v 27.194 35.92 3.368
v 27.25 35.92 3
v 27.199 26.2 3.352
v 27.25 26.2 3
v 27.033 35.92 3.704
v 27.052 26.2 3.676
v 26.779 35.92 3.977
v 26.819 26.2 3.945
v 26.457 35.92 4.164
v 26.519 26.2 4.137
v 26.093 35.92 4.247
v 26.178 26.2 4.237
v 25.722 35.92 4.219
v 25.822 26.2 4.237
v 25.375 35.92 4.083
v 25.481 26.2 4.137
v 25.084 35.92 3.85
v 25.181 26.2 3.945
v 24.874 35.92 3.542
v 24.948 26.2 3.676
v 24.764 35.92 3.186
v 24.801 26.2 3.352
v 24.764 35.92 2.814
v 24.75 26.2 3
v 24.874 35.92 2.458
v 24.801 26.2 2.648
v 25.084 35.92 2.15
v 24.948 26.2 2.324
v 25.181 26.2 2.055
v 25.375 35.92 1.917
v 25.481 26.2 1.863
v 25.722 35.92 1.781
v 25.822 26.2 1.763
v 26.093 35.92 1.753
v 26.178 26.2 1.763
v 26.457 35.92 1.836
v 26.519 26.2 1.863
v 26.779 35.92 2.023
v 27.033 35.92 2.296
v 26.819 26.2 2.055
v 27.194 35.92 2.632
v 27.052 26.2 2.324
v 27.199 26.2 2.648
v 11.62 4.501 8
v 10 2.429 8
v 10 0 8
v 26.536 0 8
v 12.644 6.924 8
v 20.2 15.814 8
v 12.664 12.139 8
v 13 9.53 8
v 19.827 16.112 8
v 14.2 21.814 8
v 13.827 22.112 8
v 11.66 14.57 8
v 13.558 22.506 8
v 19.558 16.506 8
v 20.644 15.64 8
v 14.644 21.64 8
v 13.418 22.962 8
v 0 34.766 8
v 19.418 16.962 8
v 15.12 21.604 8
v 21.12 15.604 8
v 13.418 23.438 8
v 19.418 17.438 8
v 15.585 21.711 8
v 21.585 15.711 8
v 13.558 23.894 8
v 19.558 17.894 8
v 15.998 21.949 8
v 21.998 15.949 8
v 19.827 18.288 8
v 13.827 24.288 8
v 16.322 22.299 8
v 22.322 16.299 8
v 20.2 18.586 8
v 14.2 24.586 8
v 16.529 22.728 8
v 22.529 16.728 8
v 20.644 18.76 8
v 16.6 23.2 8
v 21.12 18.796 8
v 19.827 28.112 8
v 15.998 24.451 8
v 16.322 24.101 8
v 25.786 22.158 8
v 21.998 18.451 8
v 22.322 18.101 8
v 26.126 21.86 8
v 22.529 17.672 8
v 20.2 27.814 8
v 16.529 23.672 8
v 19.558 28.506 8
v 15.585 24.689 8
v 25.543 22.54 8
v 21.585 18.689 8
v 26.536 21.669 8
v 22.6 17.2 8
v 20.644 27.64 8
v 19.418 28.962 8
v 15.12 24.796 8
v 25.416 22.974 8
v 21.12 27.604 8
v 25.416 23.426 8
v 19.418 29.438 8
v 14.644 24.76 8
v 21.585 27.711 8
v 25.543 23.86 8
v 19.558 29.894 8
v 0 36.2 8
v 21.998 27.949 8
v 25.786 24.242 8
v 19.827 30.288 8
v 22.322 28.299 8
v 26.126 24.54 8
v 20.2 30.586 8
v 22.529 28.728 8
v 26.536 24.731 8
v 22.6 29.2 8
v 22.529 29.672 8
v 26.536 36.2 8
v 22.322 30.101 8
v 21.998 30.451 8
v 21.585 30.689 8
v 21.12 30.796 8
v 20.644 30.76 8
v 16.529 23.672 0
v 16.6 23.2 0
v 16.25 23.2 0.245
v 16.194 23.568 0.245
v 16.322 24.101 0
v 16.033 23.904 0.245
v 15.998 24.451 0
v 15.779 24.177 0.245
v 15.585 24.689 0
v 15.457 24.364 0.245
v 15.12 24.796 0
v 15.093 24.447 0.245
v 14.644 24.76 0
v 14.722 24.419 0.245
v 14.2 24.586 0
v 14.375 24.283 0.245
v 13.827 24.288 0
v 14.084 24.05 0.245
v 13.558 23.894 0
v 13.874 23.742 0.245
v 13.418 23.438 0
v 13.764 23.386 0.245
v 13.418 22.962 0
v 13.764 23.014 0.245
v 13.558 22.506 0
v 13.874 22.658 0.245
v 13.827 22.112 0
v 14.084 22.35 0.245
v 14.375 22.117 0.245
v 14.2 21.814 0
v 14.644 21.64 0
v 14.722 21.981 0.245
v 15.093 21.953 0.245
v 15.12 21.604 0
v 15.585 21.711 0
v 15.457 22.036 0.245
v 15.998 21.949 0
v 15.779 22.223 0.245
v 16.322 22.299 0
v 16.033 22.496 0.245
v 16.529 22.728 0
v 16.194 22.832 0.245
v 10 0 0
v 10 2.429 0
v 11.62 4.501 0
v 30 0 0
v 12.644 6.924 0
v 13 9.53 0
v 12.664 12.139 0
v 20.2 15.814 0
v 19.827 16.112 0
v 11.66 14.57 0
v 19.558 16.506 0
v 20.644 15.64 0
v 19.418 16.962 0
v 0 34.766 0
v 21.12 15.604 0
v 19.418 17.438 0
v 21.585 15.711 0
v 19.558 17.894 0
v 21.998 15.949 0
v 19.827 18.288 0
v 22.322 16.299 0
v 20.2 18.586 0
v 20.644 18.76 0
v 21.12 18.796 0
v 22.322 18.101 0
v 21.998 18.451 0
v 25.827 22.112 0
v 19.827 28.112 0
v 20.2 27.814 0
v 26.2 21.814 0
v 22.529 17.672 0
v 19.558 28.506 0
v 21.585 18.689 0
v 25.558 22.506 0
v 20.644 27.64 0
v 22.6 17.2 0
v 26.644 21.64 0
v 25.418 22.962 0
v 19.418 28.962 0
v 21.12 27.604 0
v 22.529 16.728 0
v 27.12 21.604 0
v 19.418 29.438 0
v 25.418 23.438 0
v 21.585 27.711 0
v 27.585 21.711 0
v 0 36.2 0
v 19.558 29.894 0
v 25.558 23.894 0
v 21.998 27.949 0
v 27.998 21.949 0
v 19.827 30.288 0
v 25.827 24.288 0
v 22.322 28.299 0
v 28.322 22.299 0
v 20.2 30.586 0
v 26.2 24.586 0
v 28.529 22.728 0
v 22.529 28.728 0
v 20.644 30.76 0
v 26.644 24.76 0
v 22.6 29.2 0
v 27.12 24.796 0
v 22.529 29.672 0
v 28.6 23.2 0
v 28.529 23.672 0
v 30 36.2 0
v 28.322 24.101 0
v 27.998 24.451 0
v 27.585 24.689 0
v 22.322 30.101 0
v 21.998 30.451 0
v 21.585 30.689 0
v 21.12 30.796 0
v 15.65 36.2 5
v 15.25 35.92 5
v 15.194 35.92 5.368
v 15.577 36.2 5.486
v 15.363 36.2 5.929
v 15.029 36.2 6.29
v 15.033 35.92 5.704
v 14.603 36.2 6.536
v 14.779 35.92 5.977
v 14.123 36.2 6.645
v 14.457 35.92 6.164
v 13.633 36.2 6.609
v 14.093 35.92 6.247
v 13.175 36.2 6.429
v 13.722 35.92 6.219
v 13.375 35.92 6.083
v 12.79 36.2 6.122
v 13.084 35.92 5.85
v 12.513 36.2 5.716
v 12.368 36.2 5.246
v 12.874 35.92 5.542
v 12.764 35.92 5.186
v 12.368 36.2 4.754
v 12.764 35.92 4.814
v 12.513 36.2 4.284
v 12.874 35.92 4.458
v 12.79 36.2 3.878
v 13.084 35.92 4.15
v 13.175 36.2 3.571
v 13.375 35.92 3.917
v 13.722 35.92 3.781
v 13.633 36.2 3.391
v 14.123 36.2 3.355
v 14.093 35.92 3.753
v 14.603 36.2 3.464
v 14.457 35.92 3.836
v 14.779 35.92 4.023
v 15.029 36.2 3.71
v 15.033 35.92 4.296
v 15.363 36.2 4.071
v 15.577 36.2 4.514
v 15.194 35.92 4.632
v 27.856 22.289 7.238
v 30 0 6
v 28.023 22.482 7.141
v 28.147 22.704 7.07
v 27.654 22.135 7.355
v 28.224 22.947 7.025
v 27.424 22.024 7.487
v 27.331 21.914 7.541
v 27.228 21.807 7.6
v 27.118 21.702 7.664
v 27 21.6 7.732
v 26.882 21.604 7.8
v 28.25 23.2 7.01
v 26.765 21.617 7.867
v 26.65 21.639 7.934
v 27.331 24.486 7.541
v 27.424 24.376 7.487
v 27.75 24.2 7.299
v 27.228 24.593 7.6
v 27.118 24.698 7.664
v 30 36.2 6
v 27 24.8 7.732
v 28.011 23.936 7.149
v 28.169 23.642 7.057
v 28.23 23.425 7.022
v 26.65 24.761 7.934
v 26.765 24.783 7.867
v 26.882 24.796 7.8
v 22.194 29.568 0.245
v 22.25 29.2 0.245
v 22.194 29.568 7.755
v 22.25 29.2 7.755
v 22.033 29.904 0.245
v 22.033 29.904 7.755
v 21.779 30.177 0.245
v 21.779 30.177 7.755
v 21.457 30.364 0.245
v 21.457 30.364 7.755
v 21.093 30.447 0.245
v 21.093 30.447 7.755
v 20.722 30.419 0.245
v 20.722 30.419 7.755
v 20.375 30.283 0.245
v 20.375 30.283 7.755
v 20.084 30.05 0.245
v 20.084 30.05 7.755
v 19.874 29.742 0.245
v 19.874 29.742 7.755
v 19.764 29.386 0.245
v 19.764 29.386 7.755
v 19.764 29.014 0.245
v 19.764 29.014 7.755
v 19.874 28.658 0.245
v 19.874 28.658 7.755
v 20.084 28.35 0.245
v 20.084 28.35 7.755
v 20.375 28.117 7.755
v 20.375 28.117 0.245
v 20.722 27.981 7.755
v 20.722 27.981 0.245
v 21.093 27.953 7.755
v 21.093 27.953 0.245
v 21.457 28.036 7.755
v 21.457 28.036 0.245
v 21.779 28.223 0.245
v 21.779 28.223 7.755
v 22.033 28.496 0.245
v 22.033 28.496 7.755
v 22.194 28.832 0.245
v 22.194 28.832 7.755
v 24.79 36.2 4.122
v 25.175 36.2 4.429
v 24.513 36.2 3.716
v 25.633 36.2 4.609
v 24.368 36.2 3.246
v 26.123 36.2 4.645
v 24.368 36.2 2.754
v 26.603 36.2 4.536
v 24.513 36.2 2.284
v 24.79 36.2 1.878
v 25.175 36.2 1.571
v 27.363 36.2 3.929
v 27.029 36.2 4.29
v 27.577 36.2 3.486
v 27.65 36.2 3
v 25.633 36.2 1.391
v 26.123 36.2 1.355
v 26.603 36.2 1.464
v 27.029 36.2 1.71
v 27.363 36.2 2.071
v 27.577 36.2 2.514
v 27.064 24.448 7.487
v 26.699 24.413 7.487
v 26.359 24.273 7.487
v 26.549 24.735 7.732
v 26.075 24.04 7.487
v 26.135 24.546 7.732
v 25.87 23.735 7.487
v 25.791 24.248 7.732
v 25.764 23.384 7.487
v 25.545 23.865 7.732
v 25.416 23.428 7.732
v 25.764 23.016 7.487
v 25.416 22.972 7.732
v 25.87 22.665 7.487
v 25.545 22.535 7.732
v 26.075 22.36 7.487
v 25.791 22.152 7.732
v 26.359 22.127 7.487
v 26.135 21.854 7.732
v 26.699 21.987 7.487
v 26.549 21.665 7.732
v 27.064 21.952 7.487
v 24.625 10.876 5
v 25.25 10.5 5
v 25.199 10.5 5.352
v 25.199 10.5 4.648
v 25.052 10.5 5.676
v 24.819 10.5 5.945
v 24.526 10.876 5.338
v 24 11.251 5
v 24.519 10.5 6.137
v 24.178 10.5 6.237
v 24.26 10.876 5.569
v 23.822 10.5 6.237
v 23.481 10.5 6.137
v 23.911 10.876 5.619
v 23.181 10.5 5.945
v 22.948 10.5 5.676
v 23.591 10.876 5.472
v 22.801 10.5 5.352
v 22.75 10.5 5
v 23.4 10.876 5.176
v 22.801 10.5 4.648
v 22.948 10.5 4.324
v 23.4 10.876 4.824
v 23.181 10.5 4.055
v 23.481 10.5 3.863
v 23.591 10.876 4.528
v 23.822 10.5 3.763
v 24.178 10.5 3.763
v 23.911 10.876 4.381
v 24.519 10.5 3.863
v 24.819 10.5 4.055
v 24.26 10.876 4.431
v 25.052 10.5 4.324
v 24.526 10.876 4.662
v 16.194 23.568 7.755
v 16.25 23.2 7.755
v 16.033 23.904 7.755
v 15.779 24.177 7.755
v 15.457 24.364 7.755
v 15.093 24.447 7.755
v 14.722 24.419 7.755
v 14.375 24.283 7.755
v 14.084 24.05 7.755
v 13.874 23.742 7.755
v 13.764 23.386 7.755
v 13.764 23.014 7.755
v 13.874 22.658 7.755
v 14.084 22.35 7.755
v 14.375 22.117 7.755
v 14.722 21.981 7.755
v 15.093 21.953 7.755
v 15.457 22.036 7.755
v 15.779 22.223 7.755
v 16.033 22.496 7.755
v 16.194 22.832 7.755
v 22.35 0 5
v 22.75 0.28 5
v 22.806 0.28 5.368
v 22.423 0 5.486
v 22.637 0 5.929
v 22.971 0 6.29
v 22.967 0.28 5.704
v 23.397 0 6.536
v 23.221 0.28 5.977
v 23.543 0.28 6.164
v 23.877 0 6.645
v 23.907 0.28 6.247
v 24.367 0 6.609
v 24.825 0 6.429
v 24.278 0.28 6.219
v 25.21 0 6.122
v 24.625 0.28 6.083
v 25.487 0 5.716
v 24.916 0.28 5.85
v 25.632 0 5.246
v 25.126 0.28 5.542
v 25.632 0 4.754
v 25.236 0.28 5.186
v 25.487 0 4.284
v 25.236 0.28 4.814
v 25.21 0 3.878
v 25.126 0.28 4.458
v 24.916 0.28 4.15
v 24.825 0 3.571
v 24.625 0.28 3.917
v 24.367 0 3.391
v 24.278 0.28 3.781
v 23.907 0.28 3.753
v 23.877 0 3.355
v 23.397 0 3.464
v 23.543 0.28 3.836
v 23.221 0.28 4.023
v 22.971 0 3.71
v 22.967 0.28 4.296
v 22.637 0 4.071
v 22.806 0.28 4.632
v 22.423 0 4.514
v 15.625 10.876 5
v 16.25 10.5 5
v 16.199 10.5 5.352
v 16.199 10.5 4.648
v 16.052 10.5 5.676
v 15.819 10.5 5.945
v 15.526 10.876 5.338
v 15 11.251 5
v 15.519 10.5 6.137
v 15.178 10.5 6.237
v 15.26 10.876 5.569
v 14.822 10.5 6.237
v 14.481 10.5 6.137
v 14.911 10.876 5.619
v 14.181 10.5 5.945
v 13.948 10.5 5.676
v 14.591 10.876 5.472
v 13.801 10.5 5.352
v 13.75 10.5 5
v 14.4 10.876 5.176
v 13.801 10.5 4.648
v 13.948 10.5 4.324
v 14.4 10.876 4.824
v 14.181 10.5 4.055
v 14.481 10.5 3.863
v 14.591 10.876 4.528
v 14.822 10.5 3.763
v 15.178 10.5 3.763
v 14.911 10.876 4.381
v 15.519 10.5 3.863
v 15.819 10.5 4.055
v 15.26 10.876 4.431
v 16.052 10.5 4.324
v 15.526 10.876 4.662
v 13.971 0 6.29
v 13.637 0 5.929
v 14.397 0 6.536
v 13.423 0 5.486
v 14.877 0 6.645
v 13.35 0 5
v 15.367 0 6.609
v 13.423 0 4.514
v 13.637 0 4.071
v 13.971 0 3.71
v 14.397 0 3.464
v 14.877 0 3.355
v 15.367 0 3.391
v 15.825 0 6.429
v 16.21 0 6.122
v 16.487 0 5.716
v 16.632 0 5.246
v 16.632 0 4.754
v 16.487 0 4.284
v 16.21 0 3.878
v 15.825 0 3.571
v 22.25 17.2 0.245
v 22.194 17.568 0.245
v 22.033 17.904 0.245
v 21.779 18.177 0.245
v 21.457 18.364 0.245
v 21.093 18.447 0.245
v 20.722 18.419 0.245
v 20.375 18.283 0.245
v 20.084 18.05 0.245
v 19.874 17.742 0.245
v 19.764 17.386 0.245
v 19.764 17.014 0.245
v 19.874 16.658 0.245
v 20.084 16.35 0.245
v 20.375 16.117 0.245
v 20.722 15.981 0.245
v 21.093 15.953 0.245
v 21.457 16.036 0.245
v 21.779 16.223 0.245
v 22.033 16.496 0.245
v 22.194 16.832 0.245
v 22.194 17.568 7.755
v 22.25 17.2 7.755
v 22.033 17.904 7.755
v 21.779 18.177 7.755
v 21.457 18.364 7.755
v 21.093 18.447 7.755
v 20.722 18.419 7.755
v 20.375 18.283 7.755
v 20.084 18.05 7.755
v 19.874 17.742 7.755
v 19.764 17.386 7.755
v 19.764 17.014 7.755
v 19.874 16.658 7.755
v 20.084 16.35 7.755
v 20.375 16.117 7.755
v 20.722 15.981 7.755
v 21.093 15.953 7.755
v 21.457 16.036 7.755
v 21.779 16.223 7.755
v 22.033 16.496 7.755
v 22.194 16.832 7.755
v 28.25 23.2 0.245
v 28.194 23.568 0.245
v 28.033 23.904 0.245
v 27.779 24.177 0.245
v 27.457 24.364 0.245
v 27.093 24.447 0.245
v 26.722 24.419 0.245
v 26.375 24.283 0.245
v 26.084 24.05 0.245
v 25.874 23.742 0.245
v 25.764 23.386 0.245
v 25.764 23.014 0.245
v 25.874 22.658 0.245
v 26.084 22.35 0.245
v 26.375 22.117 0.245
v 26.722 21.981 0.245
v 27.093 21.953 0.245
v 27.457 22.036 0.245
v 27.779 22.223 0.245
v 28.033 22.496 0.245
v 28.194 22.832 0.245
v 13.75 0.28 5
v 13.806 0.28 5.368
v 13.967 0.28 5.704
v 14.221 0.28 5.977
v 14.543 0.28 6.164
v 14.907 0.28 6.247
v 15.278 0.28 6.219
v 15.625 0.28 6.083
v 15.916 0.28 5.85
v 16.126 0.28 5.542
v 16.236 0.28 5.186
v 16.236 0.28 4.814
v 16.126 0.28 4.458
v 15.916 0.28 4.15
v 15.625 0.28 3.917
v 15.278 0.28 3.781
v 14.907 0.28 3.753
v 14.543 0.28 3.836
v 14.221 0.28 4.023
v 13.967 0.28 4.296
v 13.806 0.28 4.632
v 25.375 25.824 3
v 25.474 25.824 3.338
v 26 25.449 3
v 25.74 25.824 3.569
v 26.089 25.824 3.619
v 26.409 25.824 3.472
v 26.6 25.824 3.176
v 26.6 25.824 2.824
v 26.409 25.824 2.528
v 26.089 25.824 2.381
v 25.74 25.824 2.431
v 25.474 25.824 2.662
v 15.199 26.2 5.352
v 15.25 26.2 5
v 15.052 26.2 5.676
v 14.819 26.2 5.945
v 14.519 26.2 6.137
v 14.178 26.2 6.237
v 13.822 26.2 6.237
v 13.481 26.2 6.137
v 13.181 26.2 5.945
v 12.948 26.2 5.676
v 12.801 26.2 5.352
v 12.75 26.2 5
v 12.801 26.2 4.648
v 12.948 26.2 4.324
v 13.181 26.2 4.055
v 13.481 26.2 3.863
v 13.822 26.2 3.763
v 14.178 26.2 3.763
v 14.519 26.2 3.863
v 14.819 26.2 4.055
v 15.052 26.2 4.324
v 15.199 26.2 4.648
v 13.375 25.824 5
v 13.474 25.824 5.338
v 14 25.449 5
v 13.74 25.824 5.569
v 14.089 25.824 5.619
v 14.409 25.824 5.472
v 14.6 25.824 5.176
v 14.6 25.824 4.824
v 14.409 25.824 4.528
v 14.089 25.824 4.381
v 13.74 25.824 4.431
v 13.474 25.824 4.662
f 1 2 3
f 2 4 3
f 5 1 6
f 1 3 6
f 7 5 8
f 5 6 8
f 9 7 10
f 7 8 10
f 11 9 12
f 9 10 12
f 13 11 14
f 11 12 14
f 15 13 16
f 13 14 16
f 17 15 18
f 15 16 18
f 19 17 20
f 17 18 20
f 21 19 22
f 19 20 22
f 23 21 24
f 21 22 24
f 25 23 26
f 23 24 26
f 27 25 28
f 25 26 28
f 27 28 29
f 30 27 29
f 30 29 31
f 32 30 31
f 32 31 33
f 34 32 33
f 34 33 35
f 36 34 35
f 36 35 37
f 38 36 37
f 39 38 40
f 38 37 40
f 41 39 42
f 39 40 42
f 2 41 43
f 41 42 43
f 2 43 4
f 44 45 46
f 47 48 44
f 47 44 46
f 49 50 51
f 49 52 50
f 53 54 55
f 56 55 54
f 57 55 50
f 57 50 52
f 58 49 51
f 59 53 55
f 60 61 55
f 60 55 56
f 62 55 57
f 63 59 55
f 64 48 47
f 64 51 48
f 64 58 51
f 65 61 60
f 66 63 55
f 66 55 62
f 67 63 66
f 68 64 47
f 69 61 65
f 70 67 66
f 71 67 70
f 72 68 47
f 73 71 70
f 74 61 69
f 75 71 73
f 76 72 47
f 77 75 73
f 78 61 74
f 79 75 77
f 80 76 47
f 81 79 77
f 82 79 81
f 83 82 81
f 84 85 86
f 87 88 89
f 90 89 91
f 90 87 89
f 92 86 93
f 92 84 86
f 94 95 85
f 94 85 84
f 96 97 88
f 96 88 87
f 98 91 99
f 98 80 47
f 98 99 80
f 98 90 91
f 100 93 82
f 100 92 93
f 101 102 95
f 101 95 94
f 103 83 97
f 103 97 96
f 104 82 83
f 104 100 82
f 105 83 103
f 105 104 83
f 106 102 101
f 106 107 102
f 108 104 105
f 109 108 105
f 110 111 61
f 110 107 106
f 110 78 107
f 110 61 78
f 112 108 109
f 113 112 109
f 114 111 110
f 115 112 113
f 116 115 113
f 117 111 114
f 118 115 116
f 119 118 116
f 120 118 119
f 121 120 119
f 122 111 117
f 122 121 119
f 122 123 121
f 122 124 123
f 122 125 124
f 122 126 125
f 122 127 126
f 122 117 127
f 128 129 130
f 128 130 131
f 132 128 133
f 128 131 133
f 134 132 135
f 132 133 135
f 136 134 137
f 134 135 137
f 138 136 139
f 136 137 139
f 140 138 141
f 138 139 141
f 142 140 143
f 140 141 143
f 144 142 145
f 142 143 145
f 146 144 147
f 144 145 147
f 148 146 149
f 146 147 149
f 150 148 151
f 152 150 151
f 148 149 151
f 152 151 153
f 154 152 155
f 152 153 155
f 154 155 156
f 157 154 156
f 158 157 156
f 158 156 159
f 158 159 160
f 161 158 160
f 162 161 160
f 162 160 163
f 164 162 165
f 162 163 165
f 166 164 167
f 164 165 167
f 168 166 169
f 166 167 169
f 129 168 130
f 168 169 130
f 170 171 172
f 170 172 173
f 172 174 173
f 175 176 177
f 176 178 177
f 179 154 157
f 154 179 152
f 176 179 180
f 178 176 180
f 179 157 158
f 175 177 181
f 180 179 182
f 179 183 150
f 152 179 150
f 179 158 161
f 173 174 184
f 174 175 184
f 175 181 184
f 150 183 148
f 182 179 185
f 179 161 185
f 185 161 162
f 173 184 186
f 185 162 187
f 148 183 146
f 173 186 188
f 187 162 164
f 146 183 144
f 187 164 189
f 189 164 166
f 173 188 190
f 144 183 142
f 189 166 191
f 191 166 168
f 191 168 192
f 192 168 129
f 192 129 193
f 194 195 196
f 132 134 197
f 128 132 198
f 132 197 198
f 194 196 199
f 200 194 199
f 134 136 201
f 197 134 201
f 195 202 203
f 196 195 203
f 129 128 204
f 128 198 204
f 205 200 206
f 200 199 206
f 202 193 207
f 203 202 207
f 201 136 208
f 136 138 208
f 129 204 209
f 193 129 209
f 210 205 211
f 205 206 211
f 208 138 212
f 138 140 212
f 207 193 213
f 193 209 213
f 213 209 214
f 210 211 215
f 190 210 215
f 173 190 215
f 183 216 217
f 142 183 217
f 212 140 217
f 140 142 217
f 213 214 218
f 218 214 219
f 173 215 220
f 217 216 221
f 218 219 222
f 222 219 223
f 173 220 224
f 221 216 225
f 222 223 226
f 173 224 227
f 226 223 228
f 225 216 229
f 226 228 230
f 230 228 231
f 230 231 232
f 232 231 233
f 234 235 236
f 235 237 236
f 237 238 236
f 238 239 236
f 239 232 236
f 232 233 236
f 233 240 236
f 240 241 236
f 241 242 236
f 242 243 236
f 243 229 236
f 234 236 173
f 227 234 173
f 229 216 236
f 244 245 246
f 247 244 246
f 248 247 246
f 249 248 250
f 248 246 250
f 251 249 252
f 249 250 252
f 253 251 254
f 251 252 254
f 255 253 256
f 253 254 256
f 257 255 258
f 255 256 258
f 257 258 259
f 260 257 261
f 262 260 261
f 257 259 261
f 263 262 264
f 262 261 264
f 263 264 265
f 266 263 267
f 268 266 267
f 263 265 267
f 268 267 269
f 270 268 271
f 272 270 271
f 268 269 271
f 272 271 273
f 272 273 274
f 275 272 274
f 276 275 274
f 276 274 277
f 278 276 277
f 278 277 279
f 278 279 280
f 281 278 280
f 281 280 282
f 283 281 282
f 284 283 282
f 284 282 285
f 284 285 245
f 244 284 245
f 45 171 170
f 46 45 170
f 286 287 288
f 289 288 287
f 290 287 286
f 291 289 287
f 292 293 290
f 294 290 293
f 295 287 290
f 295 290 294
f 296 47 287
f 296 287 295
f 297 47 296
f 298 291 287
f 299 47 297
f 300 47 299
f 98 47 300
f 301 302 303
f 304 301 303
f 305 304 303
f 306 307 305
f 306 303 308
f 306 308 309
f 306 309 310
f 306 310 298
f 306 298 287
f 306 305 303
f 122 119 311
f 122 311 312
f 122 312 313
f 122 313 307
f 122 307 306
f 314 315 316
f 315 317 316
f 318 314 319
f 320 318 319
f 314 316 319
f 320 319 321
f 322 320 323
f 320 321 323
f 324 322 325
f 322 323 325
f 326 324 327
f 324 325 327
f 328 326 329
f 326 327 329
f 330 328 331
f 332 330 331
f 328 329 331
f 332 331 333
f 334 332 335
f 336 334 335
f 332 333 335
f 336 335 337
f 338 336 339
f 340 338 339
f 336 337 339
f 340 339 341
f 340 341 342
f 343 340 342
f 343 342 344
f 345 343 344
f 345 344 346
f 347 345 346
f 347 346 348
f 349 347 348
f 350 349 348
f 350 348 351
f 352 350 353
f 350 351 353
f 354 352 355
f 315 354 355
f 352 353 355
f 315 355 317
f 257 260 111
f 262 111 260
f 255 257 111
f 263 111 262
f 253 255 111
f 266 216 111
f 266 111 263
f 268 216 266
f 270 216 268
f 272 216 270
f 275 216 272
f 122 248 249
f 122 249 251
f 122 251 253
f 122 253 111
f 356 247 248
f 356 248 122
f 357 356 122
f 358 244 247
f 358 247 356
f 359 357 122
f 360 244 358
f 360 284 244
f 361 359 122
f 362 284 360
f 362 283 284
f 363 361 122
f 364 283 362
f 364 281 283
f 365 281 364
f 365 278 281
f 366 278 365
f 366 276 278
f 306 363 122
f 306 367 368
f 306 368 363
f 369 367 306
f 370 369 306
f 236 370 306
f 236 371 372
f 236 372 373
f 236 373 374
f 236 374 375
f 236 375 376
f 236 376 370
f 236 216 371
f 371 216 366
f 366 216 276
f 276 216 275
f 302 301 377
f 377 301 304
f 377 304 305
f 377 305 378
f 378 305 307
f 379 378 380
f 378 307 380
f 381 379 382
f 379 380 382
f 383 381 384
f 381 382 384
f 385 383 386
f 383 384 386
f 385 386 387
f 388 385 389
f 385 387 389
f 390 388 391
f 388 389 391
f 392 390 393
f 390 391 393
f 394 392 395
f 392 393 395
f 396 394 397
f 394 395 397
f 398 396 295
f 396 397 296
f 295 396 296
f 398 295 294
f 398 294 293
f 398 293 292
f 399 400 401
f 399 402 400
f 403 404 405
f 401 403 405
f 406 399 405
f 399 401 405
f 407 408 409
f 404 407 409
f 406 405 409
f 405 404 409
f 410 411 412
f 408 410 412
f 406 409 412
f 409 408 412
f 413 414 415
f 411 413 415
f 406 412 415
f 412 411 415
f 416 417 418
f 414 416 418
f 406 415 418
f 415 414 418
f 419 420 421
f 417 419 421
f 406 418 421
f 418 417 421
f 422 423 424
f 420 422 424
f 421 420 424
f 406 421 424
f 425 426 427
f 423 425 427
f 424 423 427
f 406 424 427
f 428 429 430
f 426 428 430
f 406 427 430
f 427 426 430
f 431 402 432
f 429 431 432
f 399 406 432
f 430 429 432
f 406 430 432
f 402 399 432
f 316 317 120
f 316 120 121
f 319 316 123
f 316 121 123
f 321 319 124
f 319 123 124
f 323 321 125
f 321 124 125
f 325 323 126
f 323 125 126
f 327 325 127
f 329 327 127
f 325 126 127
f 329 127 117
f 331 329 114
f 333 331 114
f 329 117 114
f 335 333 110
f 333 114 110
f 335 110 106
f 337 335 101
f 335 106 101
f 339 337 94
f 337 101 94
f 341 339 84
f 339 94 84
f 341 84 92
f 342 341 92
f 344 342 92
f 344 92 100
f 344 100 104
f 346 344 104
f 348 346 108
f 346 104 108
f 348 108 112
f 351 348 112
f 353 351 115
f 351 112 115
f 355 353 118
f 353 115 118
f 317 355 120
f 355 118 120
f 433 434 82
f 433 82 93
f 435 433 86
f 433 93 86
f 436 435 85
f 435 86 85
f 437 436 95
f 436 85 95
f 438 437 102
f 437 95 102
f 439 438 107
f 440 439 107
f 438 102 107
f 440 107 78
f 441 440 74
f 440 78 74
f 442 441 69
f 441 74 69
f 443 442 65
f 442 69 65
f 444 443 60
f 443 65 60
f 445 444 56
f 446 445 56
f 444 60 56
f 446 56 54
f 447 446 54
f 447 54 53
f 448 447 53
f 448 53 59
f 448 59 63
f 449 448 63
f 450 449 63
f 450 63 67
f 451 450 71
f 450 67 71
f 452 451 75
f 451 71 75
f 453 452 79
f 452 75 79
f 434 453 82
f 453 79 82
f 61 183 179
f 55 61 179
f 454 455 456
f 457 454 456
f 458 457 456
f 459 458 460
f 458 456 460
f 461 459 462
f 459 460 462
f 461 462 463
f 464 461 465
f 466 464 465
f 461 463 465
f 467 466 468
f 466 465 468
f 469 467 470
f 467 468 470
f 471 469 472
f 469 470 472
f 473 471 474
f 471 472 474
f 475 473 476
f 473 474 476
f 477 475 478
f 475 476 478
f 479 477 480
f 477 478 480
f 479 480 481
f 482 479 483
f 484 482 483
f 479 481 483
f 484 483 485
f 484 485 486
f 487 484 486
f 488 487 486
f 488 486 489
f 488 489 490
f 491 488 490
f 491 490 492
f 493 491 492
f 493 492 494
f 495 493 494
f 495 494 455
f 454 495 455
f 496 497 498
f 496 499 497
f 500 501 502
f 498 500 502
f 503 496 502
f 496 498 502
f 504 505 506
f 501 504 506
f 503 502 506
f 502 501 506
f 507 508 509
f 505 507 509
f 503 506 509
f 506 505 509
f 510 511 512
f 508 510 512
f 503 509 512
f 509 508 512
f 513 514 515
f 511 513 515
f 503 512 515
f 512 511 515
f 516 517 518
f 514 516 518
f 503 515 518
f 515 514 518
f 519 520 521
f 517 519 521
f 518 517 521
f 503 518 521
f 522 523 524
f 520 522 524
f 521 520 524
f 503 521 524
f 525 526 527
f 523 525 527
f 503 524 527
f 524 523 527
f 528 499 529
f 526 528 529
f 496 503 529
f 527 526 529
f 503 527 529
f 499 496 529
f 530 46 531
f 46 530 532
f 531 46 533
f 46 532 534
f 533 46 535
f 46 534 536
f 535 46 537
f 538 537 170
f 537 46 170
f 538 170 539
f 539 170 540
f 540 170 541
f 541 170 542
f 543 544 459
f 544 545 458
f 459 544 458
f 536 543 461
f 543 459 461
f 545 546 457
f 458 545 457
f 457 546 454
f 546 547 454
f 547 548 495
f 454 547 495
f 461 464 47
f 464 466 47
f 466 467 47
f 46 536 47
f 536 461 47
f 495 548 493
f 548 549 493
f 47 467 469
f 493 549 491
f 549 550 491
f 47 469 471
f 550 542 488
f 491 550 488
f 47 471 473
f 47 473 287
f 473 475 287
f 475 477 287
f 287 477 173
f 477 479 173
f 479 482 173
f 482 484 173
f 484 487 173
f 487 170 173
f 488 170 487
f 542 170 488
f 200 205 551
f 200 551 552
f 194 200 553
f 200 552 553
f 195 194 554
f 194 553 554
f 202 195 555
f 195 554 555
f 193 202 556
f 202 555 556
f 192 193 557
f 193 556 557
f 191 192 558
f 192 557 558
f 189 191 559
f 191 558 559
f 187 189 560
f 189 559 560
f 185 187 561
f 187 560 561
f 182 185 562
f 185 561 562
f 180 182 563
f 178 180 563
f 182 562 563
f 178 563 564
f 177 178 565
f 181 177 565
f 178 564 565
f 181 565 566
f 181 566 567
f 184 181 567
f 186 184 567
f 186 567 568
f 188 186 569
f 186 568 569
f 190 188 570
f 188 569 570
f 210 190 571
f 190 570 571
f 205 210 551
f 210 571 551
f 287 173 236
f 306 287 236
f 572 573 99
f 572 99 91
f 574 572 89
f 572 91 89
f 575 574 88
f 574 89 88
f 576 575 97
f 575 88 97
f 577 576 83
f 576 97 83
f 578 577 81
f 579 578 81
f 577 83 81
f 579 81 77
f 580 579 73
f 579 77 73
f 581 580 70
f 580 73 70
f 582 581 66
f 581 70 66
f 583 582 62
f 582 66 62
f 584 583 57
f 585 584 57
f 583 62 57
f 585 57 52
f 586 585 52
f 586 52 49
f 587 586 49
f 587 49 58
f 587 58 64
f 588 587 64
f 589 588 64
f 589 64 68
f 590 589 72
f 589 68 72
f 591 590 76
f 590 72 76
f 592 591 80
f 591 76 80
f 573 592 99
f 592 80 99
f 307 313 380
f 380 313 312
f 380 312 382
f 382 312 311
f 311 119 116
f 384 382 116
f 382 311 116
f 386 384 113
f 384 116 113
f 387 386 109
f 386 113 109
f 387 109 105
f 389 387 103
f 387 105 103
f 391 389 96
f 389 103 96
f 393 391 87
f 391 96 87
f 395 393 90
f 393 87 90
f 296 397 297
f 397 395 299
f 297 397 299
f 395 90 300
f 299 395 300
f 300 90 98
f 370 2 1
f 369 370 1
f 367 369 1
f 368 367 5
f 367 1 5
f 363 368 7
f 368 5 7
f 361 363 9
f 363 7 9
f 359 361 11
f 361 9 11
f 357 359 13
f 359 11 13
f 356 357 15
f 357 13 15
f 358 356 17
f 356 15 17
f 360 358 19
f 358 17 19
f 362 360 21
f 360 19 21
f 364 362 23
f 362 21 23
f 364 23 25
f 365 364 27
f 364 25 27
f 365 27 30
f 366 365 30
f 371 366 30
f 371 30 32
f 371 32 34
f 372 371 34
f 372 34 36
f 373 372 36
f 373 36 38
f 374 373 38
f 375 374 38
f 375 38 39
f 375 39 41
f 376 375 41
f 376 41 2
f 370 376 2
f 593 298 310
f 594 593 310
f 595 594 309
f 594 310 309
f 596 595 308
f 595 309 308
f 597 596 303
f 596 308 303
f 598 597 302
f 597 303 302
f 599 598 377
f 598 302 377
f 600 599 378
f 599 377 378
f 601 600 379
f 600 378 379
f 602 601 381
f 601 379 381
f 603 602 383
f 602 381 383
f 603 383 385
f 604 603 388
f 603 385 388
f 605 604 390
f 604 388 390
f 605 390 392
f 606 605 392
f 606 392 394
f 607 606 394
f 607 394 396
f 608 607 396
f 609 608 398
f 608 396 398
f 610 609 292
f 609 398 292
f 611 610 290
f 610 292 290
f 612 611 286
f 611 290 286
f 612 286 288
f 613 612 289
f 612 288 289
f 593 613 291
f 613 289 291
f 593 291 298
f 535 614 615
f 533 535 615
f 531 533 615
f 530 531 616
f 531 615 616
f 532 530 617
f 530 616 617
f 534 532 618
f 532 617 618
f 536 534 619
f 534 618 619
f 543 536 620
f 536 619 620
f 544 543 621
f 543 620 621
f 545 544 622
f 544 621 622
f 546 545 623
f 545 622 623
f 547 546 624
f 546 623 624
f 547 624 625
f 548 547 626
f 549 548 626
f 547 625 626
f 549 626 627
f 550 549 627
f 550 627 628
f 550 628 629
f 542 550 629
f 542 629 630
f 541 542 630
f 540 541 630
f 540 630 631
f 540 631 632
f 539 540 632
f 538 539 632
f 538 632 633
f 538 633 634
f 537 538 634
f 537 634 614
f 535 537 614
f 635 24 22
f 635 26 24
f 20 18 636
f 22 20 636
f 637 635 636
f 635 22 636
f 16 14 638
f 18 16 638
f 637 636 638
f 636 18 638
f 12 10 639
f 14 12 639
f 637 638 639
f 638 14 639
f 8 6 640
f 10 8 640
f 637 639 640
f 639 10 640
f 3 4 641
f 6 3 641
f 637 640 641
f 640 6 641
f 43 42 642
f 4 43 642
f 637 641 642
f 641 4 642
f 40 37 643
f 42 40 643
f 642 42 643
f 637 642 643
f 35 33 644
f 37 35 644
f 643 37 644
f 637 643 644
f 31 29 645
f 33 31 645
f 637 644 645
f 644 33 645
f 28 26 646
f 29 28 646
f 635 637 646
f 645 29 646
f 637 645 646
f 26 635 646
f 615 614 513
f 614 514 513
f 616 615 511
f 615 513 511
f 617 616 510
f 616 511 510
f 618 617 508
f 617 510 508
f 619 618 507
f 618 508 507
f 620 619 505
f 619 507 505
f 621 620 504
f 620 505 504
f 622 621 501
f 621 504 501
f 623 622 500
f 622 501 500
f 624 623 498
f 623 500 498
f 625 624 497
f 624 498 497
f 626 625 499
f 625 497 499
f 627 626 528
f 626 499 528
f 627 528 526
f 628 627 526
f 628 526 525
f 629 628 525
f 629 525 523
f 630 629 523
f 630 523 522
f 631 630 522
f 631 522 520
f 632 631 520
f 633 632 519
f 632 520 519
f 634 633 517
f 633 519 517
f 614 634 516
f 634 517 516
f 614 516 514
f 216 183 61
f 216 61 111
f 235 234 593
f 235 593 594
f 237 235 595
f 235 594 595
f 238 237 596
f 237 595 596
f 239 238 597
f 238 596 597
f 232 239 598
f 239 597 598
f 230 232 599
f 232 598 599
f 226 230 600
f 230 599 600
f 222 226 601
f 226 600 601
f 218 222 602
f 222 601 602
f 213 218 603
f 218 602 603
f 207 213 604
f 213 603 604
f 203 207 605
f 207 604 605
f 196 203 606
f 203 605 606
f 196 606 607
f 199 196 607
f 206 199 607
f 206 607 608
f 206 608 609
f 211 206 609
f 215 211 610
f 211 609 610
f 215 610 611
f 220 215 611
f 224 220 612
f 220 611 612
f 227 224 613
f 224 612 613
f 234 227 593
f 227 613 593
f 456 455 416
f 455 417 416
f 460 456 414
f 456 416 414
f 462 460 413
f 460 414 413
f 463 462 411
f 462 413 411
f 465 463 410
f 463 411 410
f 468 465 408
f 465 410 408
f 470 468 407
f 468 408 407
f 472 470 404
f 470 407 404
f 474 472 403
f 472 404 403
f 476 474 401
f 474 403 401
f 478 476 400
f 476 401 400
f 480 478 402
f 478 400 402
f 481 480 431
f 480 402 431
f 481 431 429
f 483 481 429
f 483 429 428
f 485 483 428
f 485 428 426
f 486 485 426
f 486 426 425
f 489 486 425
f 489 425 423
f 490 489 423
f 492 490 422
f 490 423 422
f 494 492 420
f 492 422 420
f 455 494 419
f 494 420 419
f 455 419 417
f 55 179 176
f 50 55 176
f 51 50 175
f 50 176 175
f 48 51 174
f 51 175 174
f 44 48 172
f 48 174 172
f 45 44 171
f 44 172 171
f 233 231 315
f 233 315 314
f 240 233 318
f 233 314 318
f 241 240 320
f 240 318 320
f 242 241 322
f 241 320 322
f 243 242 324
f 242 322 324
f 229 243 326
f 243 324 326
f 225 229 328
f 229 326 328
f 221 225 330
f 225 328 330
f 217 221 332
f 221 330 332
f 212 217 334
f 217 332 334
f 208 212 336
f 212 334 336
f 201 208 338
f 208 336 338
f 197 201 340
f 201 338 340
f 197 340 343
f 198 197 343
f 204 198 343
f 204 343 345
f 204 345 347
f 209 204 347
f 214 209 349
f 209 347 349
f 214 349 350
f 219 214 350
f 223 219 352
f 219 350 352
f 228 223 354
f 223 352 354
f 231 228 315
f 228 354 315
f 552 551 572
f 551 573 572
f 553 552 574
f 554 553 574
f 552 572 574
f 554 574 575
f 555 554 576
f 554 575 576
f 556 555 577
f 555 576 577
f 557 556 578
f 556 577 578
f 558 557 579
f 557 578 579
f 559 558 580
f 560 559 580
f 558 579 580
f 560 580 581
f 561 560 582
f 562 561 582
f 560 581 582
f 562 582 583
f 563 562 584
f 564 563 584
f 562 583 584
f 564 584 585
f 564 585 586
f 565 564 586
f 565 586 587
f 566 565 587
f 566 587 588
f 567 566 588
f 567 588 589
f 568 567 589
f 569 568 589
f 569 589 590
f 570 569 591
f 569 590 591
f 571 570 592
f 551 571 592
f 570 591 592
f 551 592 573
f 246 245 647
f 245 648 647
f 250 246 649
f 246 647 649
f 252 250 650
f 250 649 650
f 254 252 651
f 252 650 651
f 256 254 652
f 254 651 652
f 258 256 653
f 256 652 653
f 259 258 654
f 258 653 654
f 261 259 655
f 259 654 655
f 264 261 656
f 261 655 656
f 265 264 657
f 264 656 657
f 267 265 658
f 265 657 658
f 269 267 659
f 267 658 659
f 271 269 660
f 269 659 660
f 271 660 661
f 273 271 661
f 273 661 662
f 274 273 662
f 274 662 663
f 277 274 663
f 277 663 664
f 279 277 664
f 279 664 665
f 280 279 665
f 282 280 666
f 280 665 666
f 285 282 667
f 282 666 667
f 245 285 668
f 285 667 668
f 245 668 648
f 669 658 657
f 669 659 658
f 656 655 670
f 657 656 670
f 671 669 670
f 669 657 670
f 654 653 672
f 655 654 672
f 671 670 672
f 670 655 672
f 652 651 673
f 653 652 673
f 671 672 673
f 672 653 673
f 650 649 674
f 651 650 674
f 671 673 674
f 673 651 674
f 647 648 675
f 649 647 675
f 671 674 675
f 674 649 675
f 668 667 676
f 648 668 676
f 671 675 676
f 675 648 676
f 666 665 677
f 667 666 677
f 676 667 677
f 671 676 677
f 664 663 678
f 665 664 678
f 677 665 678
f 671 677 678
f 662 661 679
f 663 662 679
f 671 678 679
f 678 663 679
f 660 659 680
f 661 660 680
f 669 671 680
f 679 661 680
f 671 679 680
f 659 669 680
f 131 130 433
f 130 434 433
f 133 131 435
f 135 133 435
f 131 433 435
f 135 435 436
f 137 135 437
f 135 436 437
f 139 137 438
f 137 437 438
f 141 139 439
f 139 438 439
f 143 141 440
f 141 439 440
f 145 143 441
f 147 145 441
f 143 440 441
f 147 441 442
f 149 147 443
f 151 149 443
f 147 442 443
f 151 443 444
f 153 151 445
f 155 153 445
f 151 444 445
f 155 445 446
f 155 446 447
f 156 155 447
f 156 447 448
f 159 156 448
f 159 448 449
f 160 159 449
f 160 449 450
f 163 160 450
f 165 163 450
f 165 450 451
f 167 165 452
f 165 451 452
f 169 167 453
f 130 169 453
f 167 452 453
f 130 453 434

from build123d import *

# Parameters (mm, degrees)
SKETCH_1_W                  = 30
SKETCH_1_H                  = 36.2
EXTRUDE_1_DEPTH             = 8
CUT_EXTRUDE_1_DEPTH         = 48.691089314
CHAMFER_1_SIZE              = 2
CHAMFER_1_SIZE2             = 3.464101615
HOLE_WIZARD_M31_D           = 2.5
HOLE_WIZARD_M31_DEPTH       = 10.5
HOLE_WIZARD_M31_CSINK_D     = 3.3
HOLE_WIZARD_M31_CSINK_ANGLE = 110
HOLE_WIZARD_M31_TIP         = 0.751075774
HOLE_WIZARD_M32_D           = 2.5
HOLE_WIZARD_M32_DEPTH       = 10
HOLE_WIZARD_M32_CSINK_D     = 3.3
HOLE_WIZARD_M32_CSINK_ANGLE = 110
HOLE_WIZARD_M32_TIP         = 0.751075774


# Read off the part's stored shape, not the designer's step: Отверстие обработанное метчиком M35
with BuildPart() as part:
    # Эскиз1 → Бобышка-Вытянуть1 (new body)
    with BuildSketch(Plane.XY):
        with Locations((15, 18.1)):
            Rectangle(SKETCH_1_W, SKETCH_1_H)
    extrude(amount=EXTRUDE_1_DEPTH)

    # Эскиз2 → Вырез-Вытянуть1 (cut, through all)
    with BuildSketch(Plane(origin=(0, 0, 0), x_dir=(-1, 0, 0), z_dir=(0, 0, -1))):
        with BuildLine():
            Line((50.920424152, 122.962914197), (0, 34.766152423))
            Line((0, 34.766152423), (-11.660254038, 14.57))
            ThreePointArc((-11.660254038, 14.57), (-12.907797949, 8.215179054), (-10, 2.428571571))
            Line((-10, 2.428571571), (-10, 0))
            Line((-10, 0), (-10, -101.840848304))
            Line((-10, -101.840848304), (186.590983298, -155.115784424))
            Line((186.590983298, -155.115784424), (247.51140745, 69.687978076))
            Line((247.51140745, 69.687978076), (50.920424152, 122.962914197))
        make_face()
    extrude(amount=-CUT_EXTRUDE_1_DEPTH, mode=Mode.SUBTRACT)

    # Фаска1
    chamfer_1_edges = [part.edges().sort_by_distance(p)[0] for p in [
        (30, 18.1, 8),
    ]]
    chamfer_1_side = [part.faces().sort_by_distance(p)[0] for p in [
        (30, 18.1, 4),
    ]]
    chamfer(chamfer_1_edges, length=CHAMFER_1_SIZE, length2=CHAMFER_1_SIZE2, reference=chamfer_1_side[0])

    # Отверстие обработанное метчиком M31
    with Locations(Plane.XZ):
        with Locations((24, 5), (15, 5)):
            CounterSinkHole(HOLE_WIZARD_M31_D / 2, HOLE_WIZARD_M31_CSINK_D / 2, depth=HOLE_WIZARD_M31_DEPTH, counter_sink_angle=HOLE_WIZARD_M31_CSINK_ANGLE)
            with Locations((0, 0, -(HOLE_WIZARD_M31_DEPTH + HOLE_WIZARD_M31_TIP / 2))):  # 118° drill point
                Cone(0, HOLE_WIZARD_M31_D / 2, HOLE_WIZARD_M31_TIP, mode=Mode.SUBTRACT)

    # Отверстие обработанное метчиком M32
    with Locations(Plane(origin=(0, 36.2, 0), x_dir=(-1, 0, 0), z_dir=(0, 1, 0))):
        with Locations((-14, 5), (-26, 3)):
            CounterSinkHole(HOLE_WIZARD_M32_D / 2, HOLE_WIZARD_M32_CSINK_D / 2, depth=HOLE_WIZARD_M32_DEPTH, counter_sink_angle=HOLE_WIZARD_M32_CSINK_ANGLE)
            with Locations((0, 0, -(HOLE_WIZARD_M32_DEPTH + HOLE_WIZARD_M32_TIP / 2))):  # 118° drill point
                Cone(0, HOLE_WIZARD_M32_D / 2, HOLE_WIZARD_M32_TIP, mode=Mode.SUBTRACT)

    # Отверстие обработанное метчиком M35 outline → Отверстие обработанное метчиком M35 (revolve, cut)
    with BuildSketch(Plane(origin=(15, 23.2, 0), x_dir=(1, 0, 0), z_dir=(0, -1, 0))):
        Polygon((1.6, 8), (0, 8), (0, 0), (1.6, 0), (1.25, 0.245072638), (1.25, 7.754927362), align=None)
    revolve(axis=Axis((15, 23.2, 0), (0, 0, 1)), mode=Mode.SUBTRACT)

    # Hole Wizard M35 2 outline → Hole Wizard M35 2 (revolve, cut)
    with BuildSketch(Plane(origin=(27, 23.2, 0), x_dir=(1, 0, 0), z_dir=(0, -1, 0))):
        Polygon((1.6, 8), (0, 8), (0, 0), (1.6, 0), (1.25, 0.245072638), (1.25, 7.486978169), (1.6, 7.732050808), align=None)
    revolve(axis=Axis((27, 23.2, 0), (0, 0, 1)), mode=Mode.SUBTRACT)

    # Hole Wizard M35 3 outline → Hole Wizard M35 3 (revolve, cut)
    with BuildSketch(Plane(origin=(21, 17.2, 0), x_dir=(1, 0, 0), z_dir=(0, -1, 0))):
        Polygon((1.6, 8), (0, 8), (0, 0), (1.6, 0), (1.25, 0.245072638), (1.25, 7.754927362), align=None)
    revolve(axis=Axis((21, 17.2, 0), (0, 0, 1)), mode=Mode.SUBTRACT)

    # Hole Wizard M35 4 outline → Hole Wizard M35 4 (revolve, cut)
    with BuildSketch(Plane(origin=(21, 29.2, 0), x_dir=(1, 0, 0), z_dir=(0, -1, 0))):
        Polygon((1.6, 8), (0, 8), (0, 0), (1.6, 0), (1.25, 0.245072638), (1.25, 7.754927362), align=None)
    revolve(axis=Axis((21, 29.2, 0), (0, 0, 1)), mode=Mode.SUBTRACT)


solid = part.part
